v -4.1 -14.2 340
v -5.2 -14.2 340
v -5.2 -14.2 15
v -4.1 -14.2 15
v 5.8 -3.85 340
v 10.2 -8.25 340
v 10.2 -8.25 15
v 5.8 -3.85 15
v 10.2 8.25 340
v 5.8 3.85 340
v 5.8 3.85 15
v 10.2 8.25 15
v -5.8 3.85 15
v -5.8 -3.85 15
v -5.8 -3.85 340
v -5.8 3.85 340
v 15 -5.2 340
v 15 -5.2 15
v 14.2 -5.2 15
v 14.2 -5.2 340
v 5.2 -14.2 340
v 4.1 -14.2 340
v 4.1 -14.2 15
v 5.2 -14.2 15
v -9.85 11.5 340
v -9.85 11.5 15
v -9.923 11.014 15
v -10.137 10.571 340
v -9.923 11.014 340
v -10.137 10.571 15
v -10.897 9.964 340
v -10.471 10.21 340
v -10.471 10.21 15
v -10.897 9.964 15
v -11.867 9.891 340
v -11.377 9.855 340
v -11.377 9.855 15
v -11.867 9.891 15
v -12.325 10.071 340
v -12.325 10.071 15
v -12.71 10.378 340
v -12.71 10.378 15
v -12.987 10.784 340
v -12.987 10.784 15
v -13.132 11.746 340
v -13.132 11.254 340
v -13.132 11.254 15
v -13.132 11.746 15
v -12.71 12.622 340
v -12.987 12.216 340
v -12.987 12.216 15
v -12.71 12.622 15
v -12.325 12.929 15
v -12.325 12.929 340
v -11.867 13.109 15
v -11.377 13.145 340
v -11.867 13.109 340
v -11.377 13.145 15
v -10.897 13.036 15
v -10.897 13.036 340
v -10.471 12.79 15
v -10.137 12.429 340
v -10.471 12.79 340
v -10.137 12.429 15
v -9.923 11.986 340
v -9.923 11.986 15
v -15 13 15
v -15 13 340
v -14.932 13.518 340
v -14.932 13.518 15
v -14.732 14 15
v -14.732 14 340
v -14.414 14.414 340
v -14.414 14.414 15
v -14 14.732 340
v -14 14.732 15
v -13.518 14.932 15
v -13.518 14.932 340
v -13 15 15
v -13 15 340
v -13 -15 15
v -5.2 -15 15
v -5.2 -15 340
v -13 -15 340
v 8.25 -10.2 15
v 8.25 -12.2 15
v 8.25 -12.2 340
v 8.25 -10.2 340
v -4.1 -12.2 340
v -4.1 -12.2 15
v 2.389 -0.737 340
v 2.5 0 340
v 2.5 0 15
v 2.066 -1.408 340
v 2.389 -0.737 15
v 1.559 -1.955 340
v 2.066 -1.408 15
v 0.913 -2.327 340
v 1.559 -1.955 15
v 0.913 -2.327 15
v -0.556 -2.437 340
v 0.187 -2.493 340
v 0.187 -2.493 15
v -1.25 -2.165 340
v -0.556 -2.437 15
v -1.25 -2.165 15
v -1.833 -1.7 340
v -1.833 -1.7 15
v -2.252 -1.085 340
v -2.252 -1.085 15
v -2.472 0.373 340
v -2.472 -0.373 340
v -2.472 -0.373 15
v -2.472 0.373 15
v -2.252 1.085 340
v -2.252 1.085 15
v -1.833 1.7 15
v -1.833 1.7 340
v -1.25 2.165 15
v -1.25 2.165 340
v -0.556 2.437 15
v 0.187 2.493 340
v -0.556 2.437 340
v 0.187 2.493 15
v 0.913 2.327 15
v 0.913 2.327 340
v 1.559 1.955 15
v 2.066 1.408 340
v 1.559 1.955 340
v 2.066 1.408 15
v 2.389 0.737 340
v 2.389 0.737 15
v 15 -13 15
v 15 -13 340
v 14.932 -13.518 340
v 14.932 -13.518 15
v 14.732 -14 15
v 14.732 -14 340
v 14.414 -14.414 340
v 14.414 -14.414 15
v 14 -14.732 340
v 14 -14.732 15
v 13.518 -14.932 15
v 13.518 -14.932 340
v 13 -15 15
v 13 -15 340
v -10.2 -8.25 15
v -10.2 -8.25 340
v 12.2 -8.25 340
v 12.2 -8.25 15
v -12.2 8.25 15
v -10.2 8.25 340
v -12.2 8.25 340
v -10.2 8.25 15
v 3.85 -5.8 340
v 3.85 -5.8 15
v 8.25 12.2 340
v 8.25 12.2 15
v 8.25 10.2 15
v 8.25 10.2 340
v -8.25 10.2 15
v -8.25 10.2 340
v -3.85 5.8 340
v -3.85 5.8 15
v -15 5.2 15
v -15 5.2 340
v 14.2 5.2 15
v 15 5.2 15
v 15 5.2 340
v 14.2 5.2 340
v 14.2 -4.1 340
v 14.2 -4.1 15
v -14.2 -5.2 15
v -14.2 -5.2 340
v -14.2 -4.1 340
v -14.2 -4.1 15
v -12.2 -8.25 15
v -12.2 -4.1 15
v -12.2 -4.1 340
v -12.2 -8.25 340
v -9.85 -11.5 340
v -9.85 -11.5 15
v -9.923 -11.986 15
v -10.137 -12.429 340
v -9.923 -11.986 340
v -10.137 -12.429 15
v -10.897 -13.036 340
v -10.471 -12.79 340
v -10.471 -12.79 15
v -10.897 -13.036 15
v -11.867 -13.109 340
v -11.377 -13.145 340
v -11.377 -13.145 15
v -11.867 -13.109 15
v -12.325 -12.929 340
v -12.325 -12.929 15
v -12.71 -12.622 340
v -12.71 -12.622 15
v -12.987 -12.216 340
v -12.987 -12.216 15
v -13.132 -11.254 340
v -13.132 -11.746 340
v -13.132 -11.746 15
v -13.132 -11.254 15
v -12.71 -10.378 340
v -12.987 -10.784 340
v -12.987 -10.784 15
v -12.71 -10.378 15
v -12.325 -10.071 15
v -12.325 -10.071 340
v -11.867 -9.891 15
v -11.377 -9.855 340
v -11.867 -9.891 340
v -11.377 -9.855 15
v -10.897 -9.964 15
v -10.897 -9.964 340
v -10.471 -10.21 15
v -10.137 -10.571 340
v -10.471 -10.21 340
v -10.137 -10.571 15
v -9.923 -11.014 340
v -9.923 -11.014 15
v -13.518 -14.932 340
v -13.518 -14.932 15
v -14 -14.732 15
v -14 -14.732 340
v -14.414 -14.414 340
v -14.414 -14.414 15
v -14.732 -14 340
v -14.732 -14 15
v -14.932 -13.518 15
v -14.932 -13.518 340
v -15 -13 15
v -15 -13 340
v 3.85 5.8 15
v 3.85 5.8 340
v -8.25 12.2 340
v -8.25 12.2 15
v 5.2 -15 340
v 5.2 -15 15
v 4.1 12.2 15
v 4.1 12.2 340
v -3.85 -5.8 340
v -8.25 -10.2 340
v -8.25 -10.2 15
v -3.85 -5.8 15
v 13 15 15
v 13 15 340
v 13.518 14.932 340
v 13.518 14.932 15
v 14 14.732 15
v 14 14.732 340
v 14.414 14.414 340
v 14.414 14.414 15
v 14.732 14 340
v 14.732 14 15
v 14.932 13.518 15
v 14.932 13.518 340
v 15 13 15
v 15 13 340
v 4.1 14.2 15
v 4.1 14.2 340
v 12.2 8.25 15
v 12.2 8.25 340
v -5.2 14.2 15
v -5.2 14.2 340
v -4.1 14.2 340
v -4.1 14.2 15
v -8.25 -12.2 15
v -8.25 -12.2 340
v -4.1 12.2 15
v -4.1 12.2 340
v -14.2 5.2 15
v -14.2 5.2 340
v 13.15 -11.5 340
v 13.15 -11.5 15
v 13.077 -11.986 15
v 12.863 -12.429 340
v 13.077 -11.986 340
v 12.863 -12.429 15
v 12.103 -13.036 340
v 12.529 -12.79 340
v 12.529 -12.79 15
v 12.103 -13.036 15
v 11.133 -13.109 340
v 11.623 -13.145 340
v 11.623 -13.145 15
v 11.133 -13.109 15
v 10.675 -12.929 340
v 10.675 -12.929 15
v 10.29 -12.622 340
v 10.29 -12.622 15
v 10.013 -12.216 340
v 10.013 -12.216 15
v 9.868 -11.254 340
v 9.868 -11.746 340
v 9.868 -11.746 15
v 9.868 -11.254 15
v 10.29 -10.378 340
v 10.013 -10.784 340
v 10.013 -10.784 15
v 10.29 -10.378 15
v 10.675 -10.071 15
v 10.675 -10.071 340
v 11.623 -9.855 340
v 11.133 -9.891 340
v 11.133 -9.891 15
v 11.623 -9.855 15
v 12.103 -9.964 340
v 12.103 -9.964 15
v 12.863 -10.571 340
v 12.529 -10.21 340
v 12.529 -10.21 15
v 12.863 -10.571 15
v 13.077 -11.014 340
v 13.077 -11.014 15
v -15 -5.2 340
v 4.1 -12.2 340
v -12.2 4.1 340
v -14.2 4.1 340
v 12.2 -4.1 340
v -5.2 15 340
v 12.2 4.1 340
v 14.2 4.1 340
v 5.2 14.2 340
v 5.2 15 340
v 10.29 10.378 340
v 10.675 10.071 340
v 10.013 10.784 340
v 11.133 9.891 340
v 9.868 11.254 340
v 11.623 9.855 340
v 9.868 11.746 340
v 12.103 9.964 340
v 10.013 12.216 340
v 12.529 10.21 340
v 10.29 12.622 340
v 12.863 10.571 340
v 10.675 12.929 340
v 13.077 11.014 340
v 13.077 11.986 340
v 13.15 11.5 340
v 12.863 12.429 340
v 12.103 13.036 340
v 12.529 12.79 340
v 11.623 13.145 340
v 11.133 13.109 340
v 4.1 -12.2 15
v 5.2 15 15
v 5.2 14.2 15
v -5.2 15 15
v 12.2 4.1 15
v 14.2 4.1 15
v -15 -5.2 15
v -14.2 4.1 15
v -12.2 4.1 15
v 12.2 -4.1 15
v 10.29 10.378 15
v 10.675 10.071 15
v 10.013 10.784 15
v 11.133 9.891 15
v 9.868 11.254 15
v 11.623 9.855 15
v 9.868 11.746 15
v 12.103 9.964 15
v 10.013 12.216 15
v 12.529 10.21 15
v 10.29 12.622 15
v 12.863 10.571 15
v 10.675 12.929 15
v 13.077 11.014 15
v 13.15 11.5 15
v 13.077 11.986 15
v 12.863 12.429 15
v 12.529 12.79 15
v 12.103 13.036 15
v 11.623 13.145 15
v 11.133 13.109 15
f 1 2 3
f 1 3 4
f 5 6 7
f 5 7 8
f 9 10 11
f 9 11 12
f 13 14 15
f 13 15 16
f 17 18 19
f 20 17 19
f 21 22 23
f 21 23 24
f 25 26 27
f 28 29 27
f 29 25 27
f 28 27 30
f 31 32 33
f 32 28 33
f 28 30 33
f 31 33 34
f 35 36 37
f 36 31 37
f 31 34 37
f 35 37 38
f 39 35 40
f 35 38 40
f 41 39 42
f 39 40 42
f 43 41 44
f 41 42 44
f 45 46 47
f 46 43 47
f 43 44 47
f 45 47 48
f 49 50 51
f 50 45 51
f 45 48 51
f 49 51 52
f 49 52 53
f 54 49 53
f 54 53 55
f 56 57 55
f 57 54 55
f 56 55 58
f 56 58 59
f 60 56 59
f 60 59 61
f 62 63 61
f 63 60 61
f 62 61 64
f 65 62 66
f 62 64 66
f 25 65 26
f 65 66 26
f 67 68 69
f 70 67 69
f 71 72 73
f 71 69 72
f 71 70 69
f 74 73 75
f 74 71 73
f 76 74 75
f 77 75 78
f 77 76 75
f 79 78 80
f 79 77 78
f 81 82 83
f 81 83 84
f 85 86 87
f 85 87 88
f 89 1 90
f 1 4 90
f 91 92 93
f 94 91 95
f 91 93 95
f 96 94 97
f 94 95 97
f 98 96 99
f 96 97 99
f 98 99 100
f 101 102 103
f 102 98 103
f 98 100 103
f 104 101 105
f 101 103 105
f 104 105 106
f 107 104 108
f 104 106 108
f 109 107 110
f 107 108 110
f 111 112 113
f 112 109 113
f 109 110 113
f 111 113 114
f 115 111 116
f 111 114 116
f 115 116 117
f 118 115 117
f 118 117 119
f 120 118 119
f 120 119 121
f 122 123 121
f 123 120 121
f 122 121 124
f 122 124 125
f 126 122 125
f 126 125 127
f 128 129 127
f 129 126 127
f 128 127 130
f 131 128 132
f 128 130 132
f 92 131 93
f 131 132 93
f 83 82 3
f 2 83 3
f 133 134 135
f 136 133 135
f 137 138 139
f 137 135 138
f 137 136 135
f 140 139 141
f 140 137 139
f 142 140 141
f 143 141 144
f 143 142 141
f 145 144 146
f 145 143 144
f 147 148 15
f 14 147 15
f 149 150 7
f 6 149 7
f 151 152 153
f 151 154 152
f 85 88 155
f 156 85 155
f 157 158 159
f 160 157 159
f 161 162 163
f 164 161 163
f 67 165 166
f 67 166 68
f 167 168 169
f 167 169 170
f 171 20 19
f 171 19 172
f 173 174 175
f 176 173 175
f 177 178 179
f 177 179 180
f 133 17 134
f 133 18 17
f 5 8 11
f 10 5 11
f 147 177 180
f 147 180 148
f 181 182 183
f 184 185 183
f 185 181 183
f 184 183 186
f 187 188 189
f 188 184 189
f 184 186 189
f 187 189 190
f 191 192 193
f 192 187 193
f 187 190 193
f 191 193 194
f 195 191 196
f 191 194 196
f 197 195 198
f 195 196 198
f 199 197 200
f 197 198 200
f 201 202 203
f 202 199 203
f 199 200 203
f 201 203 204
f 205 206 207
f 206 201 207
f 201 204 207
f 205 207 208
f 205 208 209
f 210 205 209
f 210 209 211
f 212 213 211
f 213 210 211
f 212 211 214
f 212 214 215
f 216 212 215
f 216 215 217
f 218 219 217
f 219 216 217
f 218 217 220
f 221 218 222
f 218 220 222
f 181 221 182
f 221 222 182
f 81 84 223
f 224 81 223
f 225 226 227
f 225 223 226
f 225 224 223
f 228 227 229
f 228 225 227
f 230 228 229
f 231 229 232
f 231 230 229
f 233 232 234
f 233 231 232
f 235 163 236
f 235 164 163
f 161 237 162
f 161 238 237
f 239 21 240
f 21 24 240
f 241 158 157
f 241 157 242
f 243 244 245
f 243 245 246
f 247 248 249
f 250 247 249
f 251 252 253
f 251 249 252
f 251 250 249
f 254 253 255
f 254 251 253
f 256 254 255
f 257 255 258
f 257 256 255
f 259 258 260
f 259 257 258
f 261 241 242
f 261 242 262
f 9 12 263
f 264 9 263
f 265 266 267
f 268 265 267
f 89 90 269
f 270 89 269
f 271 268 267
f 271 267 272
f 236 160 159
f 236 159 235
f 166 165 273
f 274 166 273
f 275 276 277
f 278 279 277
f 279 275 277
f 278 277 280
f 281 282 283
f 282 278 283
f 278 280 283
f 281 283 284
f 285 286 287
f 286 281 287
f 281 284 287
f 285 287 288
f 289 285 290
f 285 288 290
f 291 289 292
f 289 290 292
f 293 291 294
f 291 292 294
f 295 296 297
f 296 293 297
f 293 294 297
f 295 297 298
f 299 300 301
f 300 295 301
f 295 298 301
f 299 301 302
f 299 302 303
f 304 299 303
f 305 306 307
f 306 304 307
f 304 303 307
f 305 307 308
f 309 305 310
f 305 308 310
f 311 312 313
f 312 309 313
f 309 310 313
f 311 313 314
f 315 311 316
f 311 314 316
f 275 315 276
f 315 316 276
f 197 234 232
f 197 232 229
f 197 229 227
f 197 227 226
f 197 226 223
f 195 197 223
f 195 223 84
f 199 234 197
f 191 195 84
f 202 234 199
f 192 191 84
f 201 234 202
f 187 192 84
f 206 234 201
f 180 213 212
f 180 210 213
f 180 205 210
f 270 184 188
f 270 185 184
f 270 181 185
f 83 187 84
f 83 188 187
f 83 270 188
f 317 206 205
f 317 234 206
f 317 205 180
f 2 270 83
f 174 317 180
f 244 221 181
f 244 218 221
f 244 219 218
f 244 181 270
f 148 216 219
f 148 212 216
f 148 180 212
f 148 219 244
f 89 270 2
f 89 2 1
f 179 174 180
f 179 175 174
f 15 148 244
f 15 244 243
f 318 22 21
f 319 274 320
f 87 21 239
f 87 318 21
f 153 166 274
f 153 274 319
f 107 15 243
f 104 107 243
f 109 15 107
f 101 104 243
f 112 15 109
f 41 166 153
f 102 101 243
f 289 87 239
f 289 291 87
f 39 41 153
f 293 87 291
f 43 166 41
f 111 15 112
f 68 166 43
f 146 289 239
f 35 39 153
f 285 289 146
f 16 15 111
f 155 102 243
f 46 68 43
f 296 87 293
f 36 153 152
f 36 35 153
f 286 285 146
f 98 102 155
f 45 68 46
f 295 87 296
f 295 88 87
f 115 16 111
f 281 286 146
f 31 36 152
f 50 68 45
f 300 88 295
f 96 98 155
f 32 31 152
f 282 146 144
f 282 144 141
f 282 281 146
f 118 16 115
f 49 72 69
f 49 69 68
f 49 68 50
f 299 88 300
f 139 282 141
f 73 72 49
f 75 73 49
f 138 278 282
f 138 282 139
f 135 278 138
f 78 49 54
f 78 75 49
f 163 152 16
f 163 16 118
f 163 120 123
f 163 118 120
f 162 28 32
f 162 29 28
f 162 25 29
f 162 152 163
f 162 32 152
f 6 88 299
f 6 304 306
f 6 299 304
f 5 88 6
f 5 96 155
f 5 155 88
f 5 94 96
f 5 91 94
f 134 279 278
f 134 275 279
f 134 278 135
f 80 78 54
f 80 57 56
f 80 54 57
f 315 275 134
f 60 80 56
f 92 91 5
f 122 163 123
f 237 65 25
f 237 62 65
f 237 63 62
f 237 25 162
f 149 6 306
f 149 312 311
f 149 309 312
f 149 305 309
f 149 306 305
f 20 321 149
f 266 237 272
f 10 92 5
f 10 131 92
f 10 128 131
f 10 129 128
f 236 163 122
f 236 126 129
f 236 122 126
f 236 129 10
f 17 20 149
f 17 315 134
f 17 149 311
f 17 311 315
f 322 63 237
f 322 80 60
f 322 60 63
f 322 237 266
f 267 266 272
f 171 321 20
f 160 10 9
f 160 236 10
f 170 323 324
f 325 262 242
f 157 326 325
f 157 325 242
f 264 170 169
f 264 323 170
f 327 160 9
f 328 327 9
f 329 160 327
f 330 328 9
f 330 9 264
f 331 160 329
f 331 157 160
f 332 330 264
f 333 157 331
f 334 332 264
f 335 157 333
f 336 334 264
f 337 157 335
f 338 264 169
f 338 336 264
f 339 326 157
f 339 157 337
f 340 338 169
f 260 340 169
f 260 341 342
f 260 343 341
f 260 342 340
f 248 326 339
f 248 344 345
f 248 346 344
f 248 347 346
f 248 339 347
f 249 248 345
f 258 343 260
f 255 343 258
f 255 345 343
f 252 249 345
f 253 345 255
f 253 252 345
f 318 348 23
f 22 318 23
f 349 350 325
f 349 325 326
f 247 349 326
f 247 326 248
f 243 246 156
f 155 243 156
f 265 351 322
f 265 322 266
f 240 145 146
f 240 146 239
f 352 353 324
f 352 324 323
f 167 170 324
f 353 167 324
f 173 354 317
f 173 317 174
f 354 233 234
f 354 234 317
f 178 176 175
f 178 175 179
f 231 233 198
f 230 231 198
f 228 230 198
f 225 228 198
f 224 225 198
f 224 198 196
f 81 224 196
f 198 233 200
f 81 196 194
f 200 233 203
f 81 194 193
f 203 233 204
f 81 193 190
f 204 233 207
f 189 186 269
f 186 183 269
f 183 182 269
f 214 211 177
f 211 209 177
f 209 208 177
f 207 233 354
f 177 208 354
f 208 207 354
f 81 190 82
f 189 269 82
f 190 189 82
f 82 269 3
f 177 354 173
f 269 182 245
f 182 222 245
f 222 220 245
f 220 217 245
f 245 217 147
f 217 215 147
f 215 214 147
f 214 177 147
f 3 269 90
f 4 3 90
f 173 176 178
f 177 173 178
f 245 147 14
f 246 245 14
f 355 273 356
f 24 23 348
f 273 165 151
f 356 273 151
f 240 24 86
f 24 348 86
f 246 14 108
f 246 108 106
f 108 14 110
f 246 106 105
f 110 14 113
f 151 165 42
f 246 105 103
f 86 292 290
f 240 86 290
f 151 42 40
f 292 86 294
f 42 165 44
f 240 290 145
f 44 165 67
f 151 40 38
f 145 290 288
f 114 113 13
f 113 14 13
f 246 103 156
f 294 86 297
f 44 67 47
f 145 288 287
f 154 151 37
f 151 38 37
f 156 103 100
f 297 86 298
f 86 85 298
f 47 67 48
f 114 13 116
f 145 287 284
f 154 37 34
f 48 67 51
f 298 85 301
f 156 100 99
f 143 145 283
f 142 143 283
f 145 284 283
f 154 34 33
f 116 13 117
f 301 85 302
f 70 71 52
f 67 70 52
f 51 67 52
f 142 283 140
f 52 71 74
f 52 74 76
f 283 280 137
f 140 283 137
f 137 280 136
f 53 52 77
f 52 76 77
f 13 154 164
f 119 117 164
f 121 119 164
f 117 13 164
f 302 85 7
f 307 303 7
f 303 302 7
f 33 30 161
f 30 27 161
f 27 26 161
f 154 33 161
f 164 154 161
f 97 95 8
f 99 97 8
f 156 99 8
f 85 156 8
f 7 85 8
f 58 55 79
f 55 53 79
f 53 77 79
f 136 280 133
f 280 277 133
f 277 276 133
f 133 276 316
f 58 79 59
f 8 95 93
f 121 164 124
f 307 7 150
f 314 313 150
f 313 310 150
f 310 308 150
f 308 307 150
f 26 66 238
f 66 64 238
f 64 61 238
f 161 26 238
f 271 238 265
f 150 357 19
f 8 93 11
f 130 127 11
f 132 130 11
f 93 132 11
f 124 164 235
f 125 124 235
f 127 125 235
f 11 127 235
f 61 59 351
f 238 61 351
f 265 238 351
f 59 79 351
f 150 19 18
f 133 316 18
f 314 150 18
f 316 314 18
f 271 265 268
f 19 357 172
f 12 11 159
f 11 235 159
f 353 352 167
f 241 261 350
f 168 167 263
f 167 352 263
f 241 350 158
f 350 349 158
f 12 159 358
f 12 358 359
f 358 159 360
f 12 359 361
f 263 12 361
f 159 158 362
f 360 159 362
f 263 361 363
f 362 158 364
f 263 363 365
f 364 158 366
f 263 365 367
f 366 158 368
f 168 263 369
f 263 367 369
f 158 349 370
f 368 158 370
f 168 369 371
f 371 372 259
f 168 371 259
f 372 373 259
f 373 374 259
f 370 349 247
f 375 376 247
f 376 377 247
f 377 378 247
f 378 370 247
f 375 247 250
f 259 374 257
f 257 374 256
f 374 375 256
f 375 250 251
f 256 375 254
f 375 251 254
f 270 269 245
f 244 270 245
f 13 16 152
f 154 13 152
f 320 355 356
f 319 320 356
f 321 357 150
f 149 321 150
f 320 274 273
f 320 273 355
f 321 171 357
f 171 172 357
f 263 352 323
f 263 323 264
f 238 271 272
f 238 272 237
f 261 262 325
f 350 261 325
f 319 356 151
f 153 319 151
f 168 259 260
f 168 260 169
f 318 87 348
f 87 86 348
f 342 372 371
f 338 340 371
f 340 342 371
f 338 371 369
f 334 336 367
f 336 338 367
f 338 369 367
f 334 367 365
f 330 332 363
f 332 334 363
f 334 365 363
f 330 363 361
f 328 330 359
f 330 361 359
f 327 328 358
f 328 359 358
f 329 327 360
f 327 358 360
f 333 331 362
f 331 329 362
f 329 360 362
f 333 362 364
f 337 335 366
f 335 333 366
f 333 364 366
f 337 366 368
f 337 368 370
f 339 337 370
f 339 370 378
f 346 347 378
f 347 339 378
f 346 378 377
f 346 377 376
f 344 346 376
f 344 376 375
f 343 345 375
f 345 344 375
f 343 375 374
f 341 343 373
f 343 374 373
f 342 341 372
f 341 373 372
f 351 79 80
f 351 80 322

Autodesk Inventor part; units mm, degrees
sketch "Sketch" plane through (0, 0, 0) normal (0, 0, 1) x (1, 0, 0)
  line L0 (-13, 15) -> (13, 15)
  line L1 (15, 13) -> (15, -13)
  line L2 (-15, 15) -> (15, -15) construction
  line L3 (15, 15) -> (-15, -15) construction
  line L4 (-5.2, 15) -> (-5.2, 14.2)
  line L5 (-5.2, 14.2) -> (-4.1, 14.2)
  line L6 (-4.1, 14.2) -> (-4.1, 12.2)
  line L7 (-4.1, 12.2) -> (-8.25, 12.2)
  line L8 (-8.25, 12.2) -> (-8.25, 10.2)
  line L9 (-8.25, 10.2) -> (-3.85, 5.8)
  line L10 (-3.85, 5.8) -> (3.85, 5.8)
  line L11 (8.25, 12.2) -> (4.1, 12.2)
  line L12 (4.1, 12.2) -> (4.1, 14.2)
  line L13 (4.1, 14.2) -> (5.2, 14.2)
  line L14 (5.2, 14.2) -> (5.2, 15)
  line L15 (8.25, 12.2) -> (8.25, 10.2)
  line L16 (8.25, 10.2) -> (3.85, 5.8)
  line L17 (-2.5, 0) -> (0, 0)
  line L18 (-5.2, -15) -> (-5.2, -14.2)
  line L19 (-5.2, -14.2) -> (-4.1, -14.2)
  line L20 (-4.1, -14.2) -> (-4.1, -12.2)
  line L21 (-4.1, -12.2) -> (-8.25, -12.2)
  line L22 (-8.25, -12.2) -> (-8.25, -10.2)
  line L23 (-8.25, -10.2) -> (-3.85, -5.8)
  line L24 (-3.85, -5.8) -> (3.85, -5.8)
  line L25 (8.25, -12.2) -> (4.1, -12.2)
  line L26 (4.1, -12.2) -> (4.1, -14.2)
  line L27 (4.1, -14.2) -> (5.2, -14.2)
  line L28 (5.2, -14.2) -> (5.2, -15)
  line L29 (8.25, -12.2) -> (8.25, -10.2)
  line L30 (8.25, -10.2) -> (3.85, -5.8)
  line L31 (15, 5.2) -> (14.2, 5.2)
  line L32 (14.2, 5.2) -> (14.2, 4.1)
  line L33 (14.2, 4.1) -> (12.2, 4.1)
  line L34 (12.2, 4.1) -> (12.2, 8.25)
  line L35 (15, -5.2) -> (14.2, -5.2)
  line L36 (14.2, -5.2) -> (14.2, -4.1)
  line L37 (14.2, -4.1) -> (12.2, -4.1)
  line L38 (12.2, -4.1) -> (12.2, -8.25)
  line L39 (12.2, -8.25) -> (10.2, -8.25)
  line L40 (10.2, -8.25) -> (5.8, -3.85)
  line L41 (5.8, -3.85) -> (5.8, 3.85)
  line L42 (5.8, 3.85) -> (10.2, 8.25)
  line L43 (10.2, 8.25) -> (12.2, 8.25)
  line L44 (-15, 5.2) -> (-14.2, 5.2)
  line L45 (-14.2, 5.2) -> (-14.2, 4.1)
  line L46 (-14.2, 4.1) -> (-12.2, 4.1)
  line L47 (-12.2, 4.1) -> (-12.2, 8.25)
  line L48 (-15, -5.2) -> (-14.2, -5.2)
  line L49 (-14.2, -5.2) -> (-14.2, -4.1)
  line L50 (-14.2, -4.1) -> (-12.2, -4.1)
  line L51 (-12.2, -4.1) -> (-12.2, -8.25)
  line L52 (-12.2, -8.25) -> (-10.2, -8.25)
  line L53 (-10.2, -8.25) -> (-5.8, -3.85)
  line L54 (-5.8, -3.85) -> (-5.8, 3.85)
  line L55 (-5.8, 3.85) -> (-10.2, 8.25)
  line L56 (-10.2, 8.25) -> (-12.2, 8.25)
  circle A0 centre (11.5, 11.5) radius 1.65
  circle A1 centre (11.5, -11.5) radius 1.65
  circle A2 centre (-11.5, 11.5) radius 1.65
  circle A3 centre (-11.5, -11.5) radius 1.65
  line L57 (-15, -13) -> (-15, -5.2)
  line L58 (-15, 5.2) -> (-15, 13)
  line L59 (13, -15) -> (5.2, -15)
  line L60 (-5.2, -15) -> (-13, -15)
  arc A4 (-13, 15) -> (-15, 13) centre (-13, 13) ccw
  arc A5 (15, 13) -> (13, 15) centre (13, 13) ccw
  arc A6 (13, -15) -> (15, -13) centre (13, -13) ccw
  arc A7 (-15, -13) -> (-13, -15) centre (-13, -13) ccw
  circle A8 centre (0, 0) radius 2.5
  point P0 (0, 0)
  point P1 (0, 5.8)
  point P2 (0, -2.5)
  point P3 (0, 2.5)
  dimension "d2" = 8.2
  dimension "d3" = 4.1
  dimension "d4" = 10.4
  dimension "d5" = 5.2
  dimension "d8" = 9.2
  dimension "d11" = 16.5
  dimension "d12" = 8.25
  dimension "d14" = 0.8
  dimension "d15" = 2
  dimension "d16" = 2
  dimension "d34" = 0.8
  dimension "d35" = 10.4
  dimension "d36" = 5.2
  dimension "d37" = 8.2
  dimension "d38" = 4.1
  dimension "d39" = 2
  dimension "d40" = 16.5
  dimension "d41" = 8.25
  dimension "d42" = 2
  dimension "d43" = 9.2
  dimension "d44" = 23
  dimension "d45" = 11.5
  dimension "d46" = 23
  dimension "d48" = 3.3
  dimension "d55" = 2
  dimension "d62" = 5
  dimension "d65" = 11.5
  dimension "d66" = 6.4
  dimension "d67" = 3.25
  dimension "d68" = 4.15
  dimension "d69" = 0.8
  dimension "d70" = 2
  dimension "d71" = 2.7577
  dimension "d72" = 5.8
  dimension "d73" = 2.7577
  dimension "d74" = 4.15
  dimension "d75" = 2
  dimension "d76" = 3.25
  dimension "d77" = 2
  dimension "d78" = 1.1
  dimension "d79" = 0.8
  dimension "d80" = 135
  dimension "d81" = 2
  dimension "d82" = 1.1
  dimension "d83" = 7.4
  dimension "d84" = 7.4
  dimension "d85" = 6.4
  dimension "d86" = 6.3
ref_plane "Work Plane3" through (0, 0, 250) normal (0, 0, 1) x (1, 0, 0)
ref_plane "Start Plane" through (0, 0, 0) normal (0, 0, 1) x (1, 0, 0)
ref_plane "End Plane" through (0, 0, 400) normal (0, 0, 1) x (1, 0, 0)
ref_plane "Start Plane1" through (0, 0, 0) normal (0, 0, 1) x (1, 0, 0)
ref_plane "End Plane1" through (0, 0, 400) normal (0, 0, 1) x (1, 0, 0)
ref_plane "Start Plane2" through (0, 0, 15) normal (0, 0, 1) x (1, 0, 0)
ref_plane "End Plane2" through (0, 0, 340) normal (0, 0, 1) x (1, 0, 0)
extrude "Body" add sketch "Sketch" along normal up to surface (325 mm away) from surface at 15 contours L0 L4 L5 L6 L7 L8 L9 L10 L16 L15 L11 L12 L13 L14 A5 L1 L31 L32 L33 L34 L43 L42 L41 L40 L39 L38 L37 L36 L35 A6 L59 L28 L27 L26 L25 L29 L30 L24 L23 L22 L21 L20 L19 L18 L60 A7 L57 L48 L49 L50 L51 L52 L53 L54 L55 L56 L47 L46 L45 L44 L58 A4
sketch "Sketch7" plane through (0, 0, 0) normal (0, 0, 1) x (1, 0, 0)
  line L0 (0, 0) -> (10, 0)
ref_plane "Work Plane10" through (0, 0, 0) normal (0, -1, 0) x (1, 0, 0)
sketch "Sketch8" plane through (0, 0, 0) normal (0, -1, 0) x (1, 0, 0)
  line L0 (-2, 15) -> (12, 15)
  line L1 (-2, 340) -> (12, 340)
  dimension "d100" = 325
ref_plane "Work Plane11" through (-5.2, 225, 15) normal (0, 0, -1) x (-1, 0, 0)
split "Split1" plane through (-5.2, 225, 15) removes the side toward (0, 0, -1)
ref_plane "Work Plane12" through (0, 13, 340) normal (0, 0, 1) x (1, 0, 0)
split "Split2" plane through (0, 13, 340) removes the side toward (0, 0, 1)
equation "\"d3\" = 0.5 * d2"
equation "\"d5\" = 0.5 * d4"
equation "\"d12\" = 0.5 * d11"
equation "\"d36\" = 0.5 * d35"
equation "\"d38\" = 0.5 * d37"
equation "\"d41\" = 0.5 * d40"
equation "\"d45\" = 0.5 * d44"
equation "\"G_OFFSET_START\" = 0"
equation "\"G_OFFSET_END\" = 0"
equation "\"G_L\" = 500"
equation "\"G_OFFSET_START1\" = 0"
equation "\"G_OFFSET_END1\" = 0"
equation "\"G_OFFSET_START2\" = -15"
equation "\"d95\" = -G_OFFSET_START2"
properties part number "325 mm" material "Aluminum 6061"
